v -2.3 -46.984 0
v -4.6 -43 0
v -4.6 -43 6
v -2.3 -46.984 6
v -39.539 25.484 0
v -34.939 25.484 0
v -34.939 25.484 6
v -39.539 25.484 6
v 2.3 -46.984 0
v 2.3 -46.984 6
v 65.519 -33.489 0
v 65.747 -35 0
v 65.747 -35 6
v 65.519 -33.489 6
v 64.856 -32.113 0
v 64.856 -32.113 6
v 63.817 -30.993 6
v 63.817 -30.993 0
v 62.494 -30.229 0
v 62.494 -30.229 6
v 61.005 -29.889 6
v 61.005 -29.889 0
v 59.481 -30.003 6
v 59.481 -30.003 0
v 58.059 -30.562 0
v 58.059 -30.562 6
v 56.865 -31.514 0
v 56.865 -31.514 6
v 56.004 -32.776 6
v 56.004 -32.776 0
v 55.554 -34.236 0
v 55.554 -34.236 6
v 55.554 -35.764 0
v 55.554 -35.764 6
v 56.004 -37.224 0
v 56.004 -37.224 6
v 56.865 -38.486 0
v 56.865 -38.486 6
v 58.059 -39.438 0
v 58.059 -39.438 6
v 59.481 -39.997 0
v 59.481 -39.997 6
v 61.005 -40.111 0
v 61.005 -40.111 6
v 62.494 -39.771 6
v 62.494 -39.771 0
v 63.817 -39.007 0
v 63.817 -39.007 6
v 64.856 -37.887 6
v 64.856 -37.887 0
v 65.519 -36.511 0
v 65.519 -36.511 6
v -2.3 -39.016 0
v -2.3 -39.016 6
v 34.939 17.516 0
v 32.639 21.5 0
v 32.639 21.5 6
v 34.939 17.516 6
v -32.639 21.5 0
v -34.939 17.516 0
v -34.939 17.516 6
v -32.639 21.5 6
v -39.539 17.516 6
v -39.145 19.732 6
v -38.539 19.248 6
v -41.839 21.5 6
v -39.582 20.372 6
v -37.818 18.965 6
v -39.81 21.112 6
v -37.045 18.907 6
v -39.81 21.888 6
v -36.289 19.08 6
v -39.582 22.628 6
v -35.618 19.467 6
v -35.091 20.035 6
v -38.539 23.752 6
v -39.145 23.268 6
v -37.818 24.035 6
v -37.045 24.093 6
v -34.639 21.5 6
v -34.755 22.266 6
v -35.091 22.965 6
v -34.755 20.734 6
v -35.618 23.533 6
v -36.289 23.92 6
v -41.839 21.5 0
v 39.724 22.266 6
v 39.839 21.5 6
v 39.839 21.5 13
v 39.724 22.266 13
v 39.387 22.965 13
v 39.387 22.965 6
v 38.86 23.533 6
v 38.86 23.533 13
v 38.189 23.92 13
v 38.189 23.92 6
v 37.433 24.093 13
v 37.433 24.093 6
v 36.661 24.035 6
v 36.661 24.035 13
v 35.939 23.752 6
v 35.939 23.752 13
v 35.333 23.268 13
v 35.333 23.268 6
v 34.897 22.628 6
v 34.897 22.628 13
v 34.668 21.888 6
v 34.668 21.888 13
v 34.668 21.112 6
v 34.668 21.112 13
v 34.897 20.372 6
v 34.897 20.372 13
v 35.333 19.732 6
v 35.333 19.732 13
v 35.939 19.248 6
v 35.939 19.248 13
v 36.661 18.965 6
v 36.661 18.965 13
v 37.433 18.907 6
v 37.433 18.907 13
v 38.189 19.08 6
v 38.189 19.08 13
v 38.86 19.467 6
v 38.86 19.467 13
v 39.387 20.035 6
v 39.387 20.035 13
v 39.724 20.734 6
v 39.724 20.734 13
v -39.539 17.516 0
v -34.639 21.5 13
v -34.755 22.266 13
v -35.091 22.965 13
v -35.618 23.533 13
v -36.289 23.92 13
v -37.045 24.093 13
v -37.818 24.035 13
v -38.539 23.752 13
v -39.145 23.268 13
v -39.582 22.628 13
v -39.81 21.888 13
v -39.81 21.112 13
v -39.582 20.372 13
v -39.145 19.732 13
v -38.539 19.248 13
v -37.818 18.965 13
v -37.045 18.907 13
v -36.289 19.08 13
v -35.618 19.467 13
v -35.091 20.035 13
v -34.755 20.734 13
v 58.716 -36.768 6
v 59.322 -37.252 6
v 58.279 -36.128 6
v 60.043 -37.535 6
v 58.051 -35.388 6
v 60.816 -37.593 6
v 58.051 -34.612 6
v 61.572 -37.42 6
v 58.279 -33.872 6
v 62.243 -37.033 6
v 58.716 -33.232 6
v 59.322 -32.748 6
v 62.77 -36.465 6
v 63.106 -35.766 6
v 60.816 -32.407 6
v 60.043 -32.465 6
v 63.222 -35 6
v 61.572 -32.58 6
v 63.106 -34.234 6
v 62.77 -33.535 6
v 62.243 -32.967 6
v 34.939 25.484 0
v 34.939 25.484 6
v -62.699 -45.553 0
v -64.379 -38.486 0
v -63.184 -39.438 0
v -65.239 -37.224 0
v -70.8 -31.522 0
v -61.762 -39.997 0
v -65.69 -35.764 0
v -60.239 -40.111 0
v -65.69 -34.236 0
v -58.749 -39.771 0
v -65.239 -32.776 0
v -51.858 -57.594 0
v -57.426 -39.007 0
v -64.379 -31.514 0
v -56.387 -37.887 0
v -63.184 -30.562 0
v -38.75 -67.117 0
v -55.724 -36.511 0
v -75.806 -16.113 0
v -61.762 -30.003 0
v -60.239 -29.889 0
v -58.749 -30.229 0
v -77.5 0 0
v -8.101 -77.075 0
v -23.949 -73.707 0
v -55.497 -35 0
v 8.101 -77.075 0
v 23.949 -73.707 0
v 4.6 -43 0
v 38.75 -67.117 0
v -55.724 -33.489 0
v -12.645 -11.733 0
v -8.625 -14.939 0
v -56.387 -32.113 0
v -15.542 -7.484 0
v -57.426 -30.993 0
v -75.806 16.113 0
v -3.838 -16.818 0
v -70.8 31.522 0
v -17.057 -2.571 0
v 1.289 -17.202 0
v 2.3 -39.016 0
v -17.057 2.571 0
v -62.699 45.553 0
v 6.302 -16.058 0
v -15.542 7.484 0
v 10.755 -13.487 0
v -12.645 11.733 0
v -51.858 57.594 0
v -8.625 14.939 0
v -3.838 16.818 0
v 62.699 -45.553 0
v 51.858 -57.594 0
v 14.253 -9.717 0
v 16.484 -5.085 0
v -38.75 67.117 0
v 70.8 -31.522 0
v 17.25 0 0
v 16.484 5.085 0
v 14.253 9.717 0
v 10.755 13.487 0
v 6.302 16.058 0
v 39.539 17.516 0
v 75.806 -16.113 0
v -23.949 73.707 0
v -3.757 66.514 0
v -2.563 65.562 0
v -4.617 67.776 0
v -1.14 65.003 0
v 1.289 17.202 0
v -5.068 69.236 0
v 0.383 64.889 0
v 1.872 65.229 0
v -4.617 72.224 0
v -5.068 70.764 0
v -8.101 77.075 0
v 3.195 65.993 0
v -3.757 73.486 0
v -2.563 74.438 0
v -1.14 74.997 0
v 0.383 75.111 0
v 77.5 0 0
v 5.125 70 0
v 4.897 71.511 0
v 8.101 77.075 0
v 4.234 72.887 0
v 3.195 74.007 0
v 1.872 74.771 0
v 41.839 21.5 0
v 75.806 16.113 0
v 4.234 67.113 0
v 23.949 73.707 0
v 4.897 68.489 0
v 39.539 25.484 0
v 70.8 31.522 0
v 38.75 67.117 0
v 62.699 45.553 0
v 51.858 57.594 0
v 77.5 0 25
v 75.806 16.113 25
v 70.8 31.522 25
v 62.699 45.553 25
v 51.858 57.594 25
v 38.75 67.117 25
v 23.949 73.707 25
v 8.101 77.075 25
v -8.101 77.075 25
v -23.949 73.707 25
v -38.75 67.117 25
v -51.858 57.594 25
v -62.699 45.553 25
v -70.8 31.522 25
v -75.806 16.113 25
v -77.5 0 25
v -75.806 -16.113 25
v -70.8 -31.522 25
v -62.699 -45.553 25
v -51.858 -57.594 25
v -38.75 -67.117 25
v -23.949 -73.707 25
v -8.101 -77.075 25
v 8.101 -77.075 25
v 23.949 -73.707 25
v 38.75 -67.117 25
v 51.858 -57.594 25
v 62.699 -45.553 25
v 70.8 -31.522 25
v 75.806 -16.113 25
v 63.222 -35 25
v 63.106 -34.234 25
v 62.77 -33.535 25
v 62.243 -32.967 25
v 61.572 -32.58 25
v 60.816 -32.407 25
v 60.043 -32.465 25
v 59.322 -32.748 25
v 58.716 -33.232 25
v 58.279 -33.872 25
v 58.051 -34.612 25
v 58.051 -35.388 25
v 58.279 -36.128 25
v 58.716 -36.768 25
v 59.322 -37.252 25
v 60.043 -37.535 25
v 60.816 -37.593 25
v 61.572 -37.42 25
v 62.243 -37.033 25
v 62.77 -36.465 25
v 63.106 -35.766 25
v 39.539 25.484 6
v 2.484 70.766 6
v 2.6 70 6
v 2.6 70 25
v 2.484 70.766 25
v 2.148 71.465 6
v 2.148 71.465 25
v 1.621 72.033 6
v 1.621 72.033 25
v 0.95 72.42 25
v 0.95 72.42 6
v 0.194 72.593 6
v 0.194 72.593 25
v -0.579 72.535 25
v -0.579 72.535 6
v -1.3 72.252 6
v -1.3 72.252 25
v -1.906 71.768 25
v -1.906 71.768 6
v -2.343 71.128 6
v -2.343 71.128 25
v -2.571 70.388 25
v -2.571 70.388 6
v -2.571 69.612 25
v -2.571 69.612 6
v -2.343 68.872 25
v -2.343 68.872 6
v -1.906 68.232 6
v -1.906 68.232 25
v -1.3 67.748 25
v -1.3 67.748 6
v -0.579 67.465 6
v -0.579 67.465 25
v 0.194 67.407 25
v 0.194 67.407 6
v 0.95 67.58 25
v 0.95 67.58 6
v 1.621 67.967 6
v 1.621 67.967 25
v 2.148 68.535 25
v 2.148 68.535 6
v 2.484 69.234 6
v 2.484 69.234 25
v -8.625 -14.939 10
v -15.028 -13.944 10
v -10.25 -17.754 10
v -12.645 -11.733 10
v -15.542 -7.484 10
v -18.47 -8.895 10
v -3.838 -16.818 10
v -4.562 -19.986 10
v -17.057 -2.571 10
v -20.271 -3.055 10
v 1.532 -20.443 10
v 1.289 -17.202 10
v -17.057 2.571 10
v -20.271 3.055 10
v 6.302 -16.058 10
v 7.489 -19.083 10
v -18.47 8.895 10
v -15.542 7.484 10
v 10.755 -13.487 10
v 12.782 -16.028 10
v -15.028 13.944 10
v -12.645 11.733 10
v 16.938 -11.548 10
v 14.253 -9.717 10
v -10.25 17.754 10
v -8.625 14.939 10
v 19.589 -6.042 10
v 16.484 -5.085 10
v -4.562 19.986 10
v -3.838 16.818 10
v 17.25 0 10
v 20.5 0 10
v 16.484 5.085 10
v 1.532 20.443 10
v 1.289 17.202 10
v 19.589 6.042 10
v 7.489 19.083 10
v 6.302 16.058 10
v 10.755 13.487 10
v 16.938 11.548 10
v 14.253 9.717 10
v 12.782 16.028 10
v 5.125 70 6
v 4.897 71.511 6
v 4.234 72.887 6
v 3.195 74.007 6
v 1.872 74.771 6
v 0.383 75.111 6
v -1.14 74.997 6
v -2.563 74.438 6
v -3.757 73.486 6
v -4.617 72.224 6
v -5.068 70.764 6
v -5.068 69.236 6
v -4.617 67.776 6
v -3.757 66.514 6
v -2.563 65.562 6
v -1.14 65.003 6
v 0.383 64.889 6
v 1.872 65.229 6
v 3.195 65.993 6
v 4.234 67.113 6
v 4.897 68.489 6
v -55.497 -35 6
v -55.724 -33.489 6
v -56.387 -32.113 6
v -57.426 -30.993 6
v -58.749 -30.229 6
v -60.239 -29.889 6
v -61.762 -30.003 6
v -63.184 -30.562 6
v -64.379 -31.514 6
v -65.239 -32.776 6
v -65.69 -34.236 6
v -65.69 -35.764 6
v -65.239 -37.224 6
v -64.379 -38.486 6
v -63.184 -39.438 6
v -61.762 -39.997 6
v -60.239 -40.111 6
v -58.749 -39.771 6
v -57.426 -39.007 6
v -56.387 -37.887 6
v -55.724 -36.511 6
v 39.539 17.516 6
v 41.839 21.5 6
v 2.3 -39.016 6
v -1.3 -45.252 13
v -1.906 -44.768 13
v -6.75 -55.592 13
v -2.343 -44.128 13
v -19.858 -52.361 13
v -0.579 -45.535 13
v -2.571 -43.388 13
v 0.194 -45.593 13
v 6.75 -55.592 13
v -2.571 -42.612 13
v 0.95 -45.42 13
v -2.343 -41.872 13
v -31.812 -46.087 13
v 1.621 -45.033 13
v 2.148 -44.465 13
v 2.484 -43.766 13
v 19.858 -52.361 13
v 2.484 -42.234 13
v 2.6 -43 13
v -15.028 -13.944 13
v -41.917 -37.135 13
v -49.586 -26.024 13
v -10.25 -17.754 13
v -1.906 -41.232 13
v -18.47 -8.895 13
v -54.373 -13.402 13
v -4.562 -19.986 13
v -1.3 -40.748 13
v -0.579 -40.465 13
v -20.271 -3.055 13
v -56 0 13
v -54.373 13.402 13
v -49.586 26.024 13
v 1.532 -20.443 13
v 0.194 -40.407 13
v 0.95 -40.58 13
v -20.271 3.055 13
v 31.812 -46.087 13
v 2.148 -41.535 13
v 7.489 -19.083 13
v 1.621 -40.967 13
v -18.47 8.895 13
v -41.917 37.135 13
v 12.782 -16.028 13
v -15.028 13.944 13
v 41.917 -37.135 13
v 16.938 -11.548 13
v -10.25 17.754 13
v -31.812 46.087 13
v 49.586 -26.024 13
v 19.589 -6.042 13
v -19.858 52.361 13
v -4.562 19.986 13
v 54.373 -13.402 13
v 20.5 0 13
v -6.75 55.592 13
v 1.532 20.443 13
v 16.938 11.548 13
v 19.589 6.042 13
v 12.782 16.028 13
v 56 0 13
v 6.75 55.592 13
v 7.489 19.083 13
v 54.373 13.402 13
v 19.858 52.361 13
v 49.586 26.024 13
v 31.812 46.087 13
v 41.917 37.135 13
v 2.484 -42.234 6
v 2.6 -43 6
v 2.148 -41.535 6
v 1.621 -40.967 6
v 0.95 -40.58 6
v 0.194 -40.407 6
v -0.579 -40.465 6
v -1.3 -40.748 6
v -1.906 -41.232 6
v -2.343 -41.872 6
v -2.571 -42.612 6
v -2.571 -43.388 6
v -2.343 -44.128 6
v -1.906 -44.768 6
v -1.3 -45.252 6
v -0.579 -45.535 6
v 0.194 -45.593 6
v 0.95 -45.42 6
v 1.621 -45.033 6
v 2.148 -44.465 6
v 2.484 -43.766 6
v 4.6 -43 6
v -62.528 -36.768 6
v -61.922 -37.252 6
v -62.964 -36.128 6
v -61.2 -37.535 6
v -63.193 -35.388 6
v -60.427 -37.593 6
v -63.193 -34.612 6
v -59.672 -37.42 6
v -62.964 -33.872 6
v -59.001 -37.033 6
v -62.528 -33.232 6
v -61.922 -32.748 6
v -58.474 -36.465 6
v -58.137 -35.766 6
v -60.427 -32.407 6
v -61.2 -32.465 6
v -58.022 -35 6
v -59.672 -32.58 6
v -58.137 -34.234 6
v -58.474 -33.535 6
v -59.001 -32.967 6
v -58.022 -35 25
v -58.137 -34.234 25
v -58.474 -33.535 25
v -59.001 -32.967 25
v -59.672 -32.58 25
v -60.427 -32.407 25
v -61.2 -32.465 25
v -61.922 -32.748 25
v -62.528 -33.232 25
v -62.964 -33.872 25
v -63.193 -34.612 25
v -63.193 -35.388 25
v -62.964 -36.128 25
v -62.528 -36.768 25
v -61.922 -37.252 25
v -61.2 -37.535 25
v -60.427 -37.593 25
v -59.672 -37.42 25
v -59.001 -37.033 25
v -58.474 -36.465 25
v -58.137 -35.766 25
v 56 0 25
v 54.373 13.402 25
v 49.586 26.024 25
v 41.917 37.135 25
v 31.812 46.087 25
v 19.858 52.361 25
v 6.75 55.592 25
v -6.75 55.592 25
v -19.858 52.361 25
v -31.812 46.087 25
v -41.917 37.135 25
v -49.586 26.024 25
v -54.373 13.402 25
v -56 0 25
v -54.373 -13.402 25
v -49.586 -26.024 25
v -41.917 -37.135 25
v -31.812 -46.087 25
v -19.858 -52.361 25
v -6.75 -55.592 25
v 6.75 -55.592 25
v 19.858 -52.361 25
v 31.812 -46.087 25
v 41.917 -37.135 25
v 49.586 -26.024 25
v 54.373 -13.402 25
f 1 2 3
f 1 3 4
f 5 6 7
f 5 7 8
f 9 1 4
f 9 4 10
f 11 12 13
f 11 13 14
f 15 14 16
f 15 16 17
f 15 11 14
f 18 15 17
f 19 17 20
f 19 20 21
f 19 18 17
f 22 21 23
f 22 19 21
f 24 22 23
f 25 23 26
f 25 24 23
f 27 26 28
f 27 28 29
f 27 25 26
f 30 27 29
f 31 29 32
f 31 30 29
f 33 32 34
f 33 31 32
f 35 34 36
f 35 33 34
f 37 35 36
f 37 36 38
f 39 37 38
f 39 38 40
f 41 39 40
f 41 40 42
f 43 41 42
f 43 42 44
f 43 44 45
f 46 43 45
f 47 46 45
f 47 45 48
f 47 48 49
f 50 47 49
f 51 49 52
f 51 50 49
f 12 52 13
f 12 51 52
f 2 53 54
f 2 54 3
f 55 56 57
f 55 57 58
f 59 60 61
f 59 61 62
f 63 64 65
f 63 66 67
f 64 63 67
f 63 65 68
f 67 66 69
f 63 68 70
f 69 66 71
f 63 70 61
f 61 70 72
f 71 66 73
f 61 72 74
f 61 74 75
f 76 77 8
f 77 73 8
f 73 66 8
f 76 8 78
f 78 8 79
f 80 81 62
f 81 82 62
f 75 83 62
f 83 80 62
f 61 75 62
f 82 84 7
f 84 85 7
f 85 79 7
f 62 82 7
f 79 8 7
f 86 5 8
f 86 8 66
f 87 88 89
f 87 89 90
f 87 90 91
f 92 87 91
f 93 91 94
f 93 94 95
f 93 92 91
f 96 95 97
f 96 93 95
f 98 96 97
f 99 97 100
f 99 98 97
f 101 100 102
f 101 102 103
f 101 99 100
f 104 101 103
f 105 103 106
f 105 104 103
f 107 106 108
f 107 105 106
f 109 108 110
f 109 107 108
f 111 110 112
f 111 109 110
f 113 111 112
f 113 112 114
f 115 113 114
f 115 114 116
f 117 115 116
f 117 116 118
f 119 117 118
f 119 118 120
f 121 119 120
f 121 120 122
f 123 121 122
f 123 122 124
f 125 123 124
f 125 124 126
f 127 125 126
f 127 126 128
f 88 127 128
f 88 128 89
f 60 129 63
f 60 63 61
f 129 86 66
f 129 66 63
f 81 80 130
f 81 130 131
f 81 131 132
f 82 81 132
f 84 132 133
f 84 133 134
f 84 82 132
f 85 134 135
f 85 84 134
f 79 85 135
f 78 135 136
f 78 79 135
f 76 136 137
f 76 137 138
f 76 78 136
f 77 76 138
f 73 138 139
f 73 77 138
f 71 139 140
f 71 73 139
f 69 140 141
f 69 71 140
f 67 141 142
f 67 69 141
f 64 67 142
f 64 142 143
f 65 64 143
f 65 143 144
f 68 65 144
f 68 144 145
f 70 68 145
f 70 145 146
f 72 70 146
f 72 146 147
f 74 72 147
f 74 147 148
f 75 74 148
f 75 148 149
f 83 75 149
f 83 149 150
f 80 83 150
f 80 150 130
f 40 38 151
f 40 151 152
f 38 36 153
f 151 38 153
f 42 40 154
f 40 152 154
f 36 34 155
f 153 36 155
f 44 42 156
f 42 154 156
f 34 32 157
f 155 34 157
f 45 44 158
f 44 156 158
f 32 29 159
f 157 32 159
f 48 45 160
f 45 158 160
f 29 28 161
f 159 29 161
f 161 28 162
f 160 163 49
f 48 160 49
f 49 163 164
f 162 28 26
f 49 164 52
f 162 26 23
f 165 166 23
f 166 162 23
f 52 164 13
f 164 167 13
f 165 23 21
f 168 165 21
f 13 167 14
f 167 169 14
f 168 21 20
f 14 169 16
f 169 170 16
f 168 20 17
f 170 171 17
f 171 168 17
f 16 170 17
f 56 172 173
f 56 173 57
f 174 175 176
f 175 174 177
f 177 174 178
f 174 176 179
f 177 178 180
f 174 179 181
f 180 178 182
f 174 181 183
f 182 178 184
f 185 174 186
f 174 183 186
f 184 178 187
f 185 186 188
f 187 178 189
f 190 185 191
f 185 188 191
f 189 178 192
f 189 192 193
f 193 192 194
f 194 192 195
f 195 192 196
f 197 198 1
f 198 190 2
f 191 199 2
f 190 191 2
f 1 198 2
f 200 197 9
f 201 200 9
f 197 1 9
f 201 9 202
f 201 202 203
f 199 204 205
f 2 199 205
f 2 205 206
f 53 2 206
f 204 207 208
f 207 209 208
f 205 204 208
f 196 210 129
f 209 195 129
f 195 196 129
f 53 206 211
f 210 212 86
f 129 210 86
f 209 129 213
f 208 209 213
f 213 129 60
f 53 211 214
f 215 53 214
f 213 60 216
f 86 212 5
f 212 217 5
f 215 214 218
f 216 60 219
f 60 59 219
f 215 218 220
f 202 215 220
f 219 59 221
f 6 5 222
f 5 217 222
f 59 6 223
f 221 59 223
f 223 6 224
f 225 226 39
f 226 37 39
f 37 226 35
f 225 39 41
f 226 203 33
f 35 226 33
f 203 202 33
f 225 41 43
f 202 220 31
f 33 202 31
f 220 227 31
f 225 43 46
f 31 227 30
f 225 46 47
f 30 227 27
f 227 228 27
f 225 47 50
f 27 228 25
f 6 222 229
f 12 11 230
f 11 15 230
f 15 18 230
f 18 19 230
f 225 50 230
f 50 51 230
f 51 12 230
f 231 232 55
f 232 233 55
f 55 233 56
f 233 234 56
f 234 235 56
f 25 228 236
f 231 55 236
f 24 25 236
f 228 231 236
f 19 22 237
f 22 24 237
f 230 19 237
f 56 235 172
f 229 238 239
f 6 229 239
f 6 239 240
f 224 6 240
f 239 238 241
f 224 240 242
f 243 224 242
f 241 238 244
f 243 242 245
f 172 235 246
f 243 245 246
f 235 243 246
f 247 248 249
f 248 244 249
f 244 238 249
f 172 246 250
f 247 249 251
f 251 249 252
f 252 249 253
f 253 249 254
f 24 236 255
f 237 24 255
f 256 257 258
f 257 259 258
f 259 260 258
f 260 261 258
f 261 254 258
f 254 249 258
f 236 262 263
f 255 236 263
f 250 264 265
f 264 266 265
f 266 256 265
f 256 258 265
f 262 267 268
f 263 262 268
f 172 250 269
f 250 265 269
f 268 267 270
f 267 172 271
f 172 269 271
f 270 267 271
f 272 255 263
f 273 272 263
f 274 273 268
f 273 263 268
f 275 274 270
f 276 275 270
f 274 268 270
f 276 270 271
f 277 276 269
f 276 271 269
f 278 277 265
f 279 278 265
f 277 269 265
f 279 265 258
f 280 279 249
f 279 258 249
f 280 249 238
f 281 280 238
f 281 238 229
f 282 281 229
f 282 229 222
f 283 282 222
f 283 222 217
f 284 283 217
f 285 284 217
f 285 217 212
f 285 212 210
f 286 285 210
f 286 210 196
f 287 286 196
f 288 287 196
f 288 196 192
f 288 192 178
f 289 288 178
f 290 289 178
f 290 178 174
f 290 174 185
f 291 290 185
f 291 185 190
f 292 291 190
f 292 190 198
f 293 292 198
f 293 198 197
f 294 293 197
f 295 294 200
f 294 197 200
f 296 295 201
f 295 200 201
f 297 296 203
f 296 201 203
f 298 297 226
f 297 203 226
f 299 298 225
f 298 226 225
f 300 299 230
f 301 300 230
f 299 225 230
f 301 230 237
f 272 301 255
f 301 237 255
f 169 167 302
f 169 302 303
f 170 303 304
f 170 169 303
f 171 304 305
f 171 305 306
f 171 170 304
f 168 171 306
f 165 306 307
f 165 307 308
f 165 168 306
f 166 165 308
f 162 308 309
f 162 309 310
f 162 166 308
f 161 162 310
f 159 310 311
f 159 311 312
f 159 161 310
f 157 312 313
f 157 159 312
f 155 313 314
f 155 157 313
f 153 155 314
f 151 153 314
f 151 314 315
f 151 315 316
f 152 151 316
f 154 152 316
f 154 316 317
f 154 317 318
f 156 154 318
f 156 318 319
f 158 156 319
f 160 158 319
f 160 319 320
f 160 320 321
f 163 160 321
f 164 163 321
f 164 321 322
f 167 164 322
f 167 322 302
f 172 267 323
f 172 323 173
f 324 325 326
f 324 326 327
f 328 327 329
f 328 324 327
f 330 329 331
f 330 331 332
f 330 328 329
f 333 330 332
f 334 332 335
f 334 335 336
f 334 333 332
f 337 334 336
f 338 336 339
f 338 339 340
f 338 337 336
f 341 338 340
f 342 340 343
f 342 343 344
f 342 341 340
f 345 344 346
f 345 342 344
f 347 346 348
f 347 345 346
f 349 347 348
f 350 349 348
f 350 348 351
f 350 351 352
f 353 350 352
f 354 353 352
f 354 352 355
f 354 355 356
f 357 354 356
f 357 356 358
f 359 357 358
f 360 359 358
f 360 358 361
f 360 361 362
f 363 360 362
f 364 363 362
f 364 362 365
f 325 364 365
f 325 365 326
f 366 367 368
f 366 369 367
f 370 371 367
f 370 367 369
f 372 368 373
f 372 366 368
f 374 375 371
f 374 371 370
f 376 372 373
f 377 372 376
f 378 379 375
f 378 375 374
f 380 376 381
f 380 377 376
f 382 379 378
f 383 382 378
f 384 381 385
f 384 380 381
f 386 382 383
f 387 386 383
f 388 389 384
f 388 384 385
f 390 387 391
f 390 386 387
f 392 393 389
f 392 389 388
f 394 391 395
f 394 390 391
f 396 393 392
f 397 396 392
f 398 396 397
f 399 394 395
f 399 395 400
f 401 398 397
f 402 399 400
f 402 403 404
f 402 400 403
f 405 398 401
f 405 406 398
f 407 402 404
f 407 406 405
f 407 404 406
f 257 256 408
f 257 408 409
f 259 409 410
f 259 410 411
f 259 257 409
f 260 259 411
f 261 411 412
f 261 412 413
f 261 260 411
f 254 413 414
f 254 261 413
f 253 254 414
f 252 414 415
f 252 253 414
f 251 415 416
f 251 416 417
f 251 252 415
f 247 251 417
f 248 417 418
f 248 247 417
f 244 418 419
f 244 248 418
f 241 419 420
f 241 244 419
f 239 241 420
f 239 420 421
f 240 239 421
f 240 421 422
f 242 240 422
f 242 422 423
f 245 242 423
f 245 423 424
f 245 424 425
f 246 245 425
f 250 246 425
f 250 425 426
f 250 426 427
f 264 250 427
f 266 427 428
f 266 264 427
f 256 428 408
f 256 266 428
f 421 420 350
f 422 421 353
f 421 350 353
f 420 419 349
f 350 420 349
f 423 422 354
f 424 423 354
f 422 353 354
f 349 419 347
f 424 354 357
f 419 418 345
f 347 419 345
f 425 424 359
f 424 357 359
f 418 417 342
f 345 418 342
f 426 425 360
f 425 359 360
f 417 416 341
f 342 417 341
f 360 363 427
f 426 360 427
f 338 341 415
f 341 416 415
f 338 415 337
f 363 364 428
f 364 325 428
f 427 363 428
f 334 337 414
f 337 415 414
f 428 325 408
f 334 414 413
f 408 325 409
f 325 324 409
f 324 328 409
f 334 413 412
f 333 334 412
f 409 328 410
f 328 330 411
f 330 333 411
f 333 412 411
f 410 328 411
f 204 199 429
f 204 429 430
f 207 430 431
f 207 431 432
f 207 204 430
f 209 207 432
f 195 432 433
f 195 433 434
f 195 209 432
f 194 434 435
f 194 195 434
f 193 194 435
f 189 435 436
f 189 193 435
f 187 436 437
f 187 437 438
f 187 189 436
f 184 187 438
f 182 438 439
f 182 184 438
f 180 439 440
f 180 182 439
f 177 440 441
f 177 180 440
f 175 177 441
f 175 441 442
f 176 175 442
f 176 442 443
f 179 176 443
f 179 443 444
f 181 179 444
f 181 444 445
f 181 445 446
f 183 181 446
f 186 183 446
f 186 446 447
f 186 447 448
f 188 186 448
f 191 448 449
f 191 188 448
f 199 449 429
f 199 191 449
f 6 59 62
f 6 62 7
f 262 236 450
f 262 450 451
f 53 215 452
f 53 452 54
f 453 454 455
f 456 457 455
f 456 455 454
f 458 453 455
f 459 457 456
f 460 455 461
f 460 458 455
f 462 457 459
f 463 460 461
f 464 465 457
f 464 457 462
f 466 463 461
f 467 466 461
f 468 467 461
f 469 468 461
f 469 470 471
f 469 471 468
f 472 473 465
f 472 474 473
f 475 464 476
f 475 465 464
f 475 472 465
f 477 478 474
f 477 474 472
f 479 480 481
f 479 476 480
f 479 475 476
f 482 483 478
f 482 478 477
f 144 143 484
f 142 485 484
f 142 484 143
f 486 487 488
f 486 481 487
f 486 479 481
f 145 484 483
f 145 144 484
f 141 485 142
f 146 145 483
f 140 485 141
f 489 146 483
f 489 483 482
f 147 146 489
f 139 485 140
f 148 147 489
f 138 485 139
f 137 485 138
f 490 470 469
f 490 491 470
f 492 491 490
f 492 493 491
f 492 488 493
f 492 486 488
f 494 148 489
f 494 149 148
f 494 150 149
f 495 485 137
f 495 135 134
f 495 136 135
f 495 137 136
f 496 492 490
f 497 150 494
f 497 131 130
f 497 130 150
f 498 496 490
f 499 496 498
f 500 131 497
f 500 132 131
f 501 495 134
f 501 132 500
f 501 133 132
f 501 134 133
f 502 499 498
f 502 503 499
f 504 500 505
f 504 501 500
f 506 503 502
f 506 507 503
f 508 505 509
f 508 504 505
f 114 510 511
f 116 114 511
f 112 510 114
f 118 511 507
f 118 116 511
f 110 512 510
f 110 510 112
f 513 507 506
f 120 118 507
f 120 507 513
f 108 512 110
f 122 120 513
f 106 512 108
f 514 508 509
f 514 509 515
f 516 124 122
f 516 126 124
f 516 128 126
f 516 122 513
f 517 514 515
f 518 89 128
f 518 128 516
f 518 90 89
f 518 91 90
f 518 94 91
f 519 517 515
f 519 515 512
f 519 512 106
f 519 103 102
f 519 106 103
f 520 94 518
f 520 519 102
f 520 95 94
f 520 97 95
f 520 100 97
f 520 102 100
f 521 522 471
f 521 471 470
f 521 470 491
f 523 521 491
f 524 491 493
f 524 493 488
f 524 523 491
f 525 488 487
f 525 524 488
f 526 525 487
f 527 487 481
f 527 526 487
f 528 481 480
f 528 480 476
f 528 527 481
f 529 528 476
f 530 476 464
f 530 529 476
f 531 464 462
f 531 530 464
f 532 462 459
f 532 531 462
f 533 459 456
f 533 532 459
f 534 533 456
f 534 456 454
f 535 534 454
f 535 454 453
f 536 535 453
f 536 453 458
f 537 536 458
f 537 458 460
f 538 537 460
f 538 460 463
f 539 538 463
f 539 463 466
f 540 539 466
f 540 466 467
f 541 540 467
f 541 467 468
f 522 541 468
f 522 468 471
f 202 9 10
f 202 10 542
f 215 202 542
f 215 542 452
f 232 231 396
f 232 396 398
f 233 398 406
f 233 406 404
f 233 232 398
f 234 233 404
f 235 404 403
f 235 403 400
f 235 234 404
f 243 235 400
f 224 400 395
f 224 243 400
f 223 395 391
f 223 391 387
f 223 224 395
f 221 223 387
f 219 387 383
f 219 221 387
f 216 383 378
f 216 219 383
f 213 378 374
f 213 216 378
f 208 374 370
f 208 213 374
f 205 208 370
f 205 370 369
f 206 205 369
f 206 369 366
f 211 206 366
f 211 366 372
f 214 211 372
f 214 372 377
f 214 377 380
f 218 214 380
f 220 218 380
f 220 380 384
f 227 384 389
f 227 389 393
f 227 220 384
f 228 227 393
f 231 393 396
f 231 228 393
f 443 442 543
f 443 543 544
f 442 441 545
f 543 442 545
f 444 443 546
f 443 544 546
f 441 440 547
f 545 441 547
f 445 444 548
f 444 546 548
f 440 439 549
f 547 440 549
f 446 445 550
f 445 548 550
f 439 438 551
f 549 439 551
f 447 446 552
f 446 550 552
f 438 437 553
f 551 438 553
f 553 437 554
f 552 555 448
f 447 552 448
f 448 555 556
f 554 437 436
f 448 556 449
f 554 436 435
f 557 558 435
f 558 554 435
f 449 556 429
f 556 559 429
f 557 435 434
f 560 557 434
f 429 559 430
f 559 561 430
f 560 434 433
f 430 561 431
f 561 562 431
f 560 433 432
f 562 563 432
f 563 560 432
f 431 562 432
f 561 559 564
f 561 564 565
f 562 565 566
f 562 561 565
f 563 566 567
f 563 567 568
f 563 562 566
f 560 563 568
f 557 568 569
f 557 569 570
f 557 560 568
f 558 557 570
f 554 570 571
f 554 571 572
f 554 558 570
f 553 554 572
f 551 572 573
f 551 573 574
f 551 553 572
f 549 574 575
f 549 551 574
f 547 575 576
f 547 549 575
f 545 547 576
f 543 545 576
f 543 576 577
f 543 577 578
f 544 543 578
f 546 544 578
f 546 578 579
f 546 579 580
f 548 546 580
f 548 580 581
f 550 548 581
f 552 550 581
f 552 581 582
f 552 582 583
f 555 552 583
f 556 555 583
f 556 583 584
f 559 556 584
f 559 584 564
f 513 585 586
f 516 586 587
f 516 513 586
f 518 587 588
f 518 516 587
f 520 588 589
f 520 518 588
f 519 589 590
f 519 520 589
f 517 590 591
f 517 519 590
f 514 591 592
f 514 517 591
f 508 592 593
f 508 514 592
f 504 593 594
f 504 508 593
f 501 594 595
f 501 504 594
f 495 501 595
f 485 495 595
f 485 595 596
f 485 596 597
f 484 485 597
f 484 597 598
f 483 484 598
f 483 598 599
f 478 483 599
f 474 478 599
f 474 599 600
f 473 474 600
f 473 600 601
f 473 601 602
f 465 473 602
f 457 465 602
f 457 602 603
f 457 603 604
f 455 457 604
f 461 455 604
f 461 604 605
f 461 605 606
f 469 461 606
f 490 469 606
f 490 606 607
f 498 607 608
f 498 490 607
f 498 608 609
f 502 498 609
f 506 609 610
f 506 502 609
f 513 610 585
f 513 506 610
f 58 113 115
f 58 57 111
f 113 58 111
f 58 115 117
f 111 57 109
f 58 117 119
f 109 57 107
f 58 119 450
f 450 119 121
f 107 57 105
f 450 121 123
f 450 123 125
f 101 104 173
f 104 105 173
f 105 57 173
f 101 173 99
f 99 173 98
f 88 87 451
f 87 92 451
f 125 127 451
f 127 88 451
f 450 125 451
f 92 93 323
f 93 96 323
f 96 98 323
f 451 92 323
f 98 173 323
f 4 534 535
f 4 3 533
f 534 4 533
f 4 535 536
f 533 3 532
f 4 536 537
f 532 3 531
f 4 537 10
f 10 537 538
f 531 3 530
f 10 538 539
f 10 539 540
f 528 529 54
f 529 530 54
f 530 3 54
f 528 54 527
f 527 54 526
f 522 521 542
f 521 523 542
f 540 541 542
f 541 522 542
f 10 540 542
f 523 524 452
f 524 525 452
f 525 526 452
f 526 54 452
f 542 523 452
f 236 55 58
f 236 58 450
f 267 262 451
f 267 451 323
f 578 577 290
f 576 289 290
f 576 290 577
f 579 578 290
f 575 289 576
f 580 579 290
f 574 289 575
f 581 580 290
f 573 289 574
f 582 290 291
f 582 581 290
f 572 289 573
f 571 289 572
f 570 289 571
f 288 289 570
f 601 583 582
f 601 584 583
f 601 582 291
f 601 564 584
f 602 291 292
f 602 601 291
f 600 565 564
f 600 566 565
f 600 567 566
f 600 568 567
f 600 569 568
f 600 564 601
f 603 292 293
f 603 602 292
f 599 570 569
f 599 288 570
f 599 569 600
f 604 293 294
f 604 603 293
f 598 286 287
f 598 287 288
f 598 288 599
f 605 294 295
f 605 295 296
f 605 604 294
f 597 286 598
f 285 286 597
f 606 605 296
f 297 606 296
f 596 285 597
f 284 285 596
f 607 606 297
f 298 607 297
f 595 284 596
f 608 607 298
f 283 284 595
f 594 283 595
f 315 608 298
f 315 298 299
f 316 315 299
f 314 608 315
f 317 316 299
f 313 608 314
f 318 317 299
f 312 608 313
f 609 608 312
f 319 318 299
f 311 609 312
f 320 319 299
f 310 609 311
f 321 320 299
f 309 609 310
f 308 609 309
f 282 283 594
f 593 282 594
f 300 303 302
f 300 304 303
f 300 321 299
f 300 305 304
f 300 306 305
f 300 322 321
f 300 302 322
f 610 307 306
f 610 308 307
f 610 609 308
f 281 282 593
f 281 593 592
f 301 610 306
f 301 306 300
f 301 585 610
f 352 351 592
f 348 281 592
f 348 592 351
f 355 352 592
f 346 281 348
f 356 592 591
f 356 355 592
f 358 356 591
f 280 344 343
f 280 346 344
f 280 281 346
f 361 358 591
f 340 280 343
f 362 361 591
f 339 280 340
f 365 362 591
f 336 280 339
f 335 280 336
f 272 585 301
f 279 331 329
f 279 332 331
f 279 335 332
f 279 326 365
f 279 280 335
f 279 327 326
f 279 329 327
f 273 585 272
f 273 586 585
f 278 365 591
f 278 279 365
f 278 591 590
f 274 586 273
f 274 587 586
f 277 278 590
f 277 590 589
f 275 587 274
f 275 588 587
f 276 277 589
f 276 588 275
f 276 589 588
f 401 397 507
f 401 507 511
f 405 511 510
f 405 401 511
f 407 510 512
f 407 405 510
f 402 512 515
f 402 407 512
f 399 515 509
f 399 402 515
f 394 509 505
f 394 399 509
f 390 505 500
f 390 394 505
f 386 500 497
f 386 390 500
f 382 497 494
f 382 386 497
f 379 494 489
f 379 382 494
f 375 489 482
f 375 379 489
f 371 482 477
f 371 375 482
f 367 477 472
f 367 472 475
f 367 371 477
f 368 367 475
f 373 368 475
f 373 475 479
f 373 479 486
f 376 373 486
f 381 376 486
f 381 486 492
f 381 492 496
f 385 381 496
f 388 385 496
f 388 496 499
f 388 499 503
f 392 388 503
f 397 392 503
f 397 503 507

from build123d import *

# Parameters (mm, degrees)
F0_R     = 77.5
F0_R_2   = 5.125
F0_R_3   = 56
F0_R_4   = 20.5
F0_R_5   = 2.6
F1_DEPTH = 13
F2_DEPTH = 25
F0_R_6   = 17.25
F3_DEPTH = 10
F4_DEPTH = 6
F5_DEPTH = 6


with BuildPart() as f1:
    # F0 (on Top) → F1 (new body)
    with BuildSketch(Plane.XY):
        Circle(F0_R)
        with Locations((-60.621778, -35)):
            Circle(F0_R_2, mode=Mode.SUBTRACT)
        with Locations((60.621778, -35)):
            Circle(F0_R_2, mode=Mode.SUBTRACT)
        Circle(F0_R_3, mode=Mode.SUBTRACT)
        with Locations((0, 70)):
            Circle(F0_R_2, mode=Mode.SUBTRACT)
        Circle(F0_R_3)
        Polygon((-4.6, -43), (-2.3, -39.016283), (2.3, -39.016283), (4.6, -43), (2.3, -46.983717), (-2.3, -46.983717), align=None, mode=Mode.SUBTRACT)
        Polygon((-34.939092, 25.483717), (-32.639092, 21.5), (-34.939092, 17.516283), (-39.539092, 17.516283), (-41.839092, 21.5), (-39.539092, 25.483717), align=None, mode=Mode.SUBTRACT)
        Circle(F0_R_4, mode=Mode.SUBTRACT)
        Polygon((34.939092, 17.516283), (32.639092, 21.5), (34.939092, 25.483717), (39.539092, 25.483717), (41.839092, 21.5), (39.539092, 17.516283), align=None, mode=Mode.SUBTRACT)
        with Locations((0, 70)):
            Circle(F0_R_2)
        with Locations((0, 70)):
            Circle(F0_R_5, mode=Mode.SUBTRACT)
        Polygon((-34.939092, 17.516283), (-32.639092, 21.5), (-34.939092, 25.483717), (-39.539092, 25.483717), (-41.839092, 21.5), (-39.539092, 17.516283), align=None)
        with Locations((-37.239092, 21.5)):
            Circle(F0_R_5, mode=Mode.SUBTRACT)
        Polygon((34.939092, 25.483717), (32.639092, 21.5), (34.939092, 17.516283), (39.539092, 17.516283), (41.839092, 21.5), (39.539092, 25.483717), align=None)
        with Locations((37.239092, 21.5)):
            Circle(F0_R_5, mode=Mode.SUBTRACT)
        with Locations((60.621778, -35)):
            Circle(F0_R_2)
        with Locations((60.621778, -35)):
            Circle(F0_R_5, mode=Mode.SUBTRACT)
        Polygon((2.3, -39.016283), (-2.3, -39.016283), (-4.6, -43), (-2.3, -46.983717), (2.3, -46.983717), (4.6, -43), align=None)
        with Locations((0, -43)):
            Circle(F0_R_5, mode=Mode.SUBTRACT)
        with Locations((-60.621778, -35)):
            Circle(F0_R_2)
        with Locations((-60.621778, -35)):
            Circle(F0_R_5, mode=Mode.SUBTRACT)
    extrude(amount=F1_DEPTH)

    # F0 (on Top) → F2 (join)
    with BuildSketch(Plane.XY):
        Circle(F0_R)
        with Locations((-60.621778, -35)):
            Circle(F0_R_2, mode=Mode.SUBTRACT)
        with Locations((60.621778, -35)):
            Circle(F0_R_2, mode=Mode.SUBTRACT)
        Circle(F0_R_3, mode=Mode.SUBTRACT)
        with Locations((0, 70)):
            Circle(F0_R_2, mode=Mode.SUBTRACT)
        with Locations((0, 70)):
            Circle(F0_R_2)
        with Locations((0, 70)):
            Circle(F0_R_5, mode=Mode.SUBTRACT)
        with Locations((60.621778, -35)):
            Circle(F0_R_2)
        with Locations((60.621778, -35)):
            Circle(F0_R_5, mode=Mode.SUBTRACT)
        with Locations((-60.621778, -35)):
            Circle(F0_R_2)
        with Locations((-60.621778, -35)):
            Circle(F0_R_5, mode=Mode.SUBTRACT)
    extrude(amount=F2_DEPTH)

    # F0 (on Top) → F3 (join)
    with BuildSketch(Plane.XY):
        Circle(F0_R_4)
        Circle(F0_R_6, mode=Mode.SUBTRACT)
    extrude(amount=F3_DEPTH)

    # F0 (on Top) → F4 (cut)
    with BuildSketch(Plane.XY):
        with Locations((0, 70)):
            Circle(F0_R_2)
        with Locations((0, 70)):
            Circle(F0_R_5, mode=Mode.SUBTRACT)
        with Locations((-60.621778, -35)):
            Circle(F0_R_2)
        with Locations((-60.621778, -35)):
            Circle(F0_R_5, mode=Mode.SUBTRACT)
        with Locations((60.621778, -35)):
            Circle(F0_R_2)
        with Locations((60.621778, -35)):
            Circle(F0_R_5, mode=Mode.SUBTRACT)
    extrude(amount=F4_DEPTH, mode=Mode.SUBTRACT)

    # F0 (on Top) → F5 (cut)
    with BuildSketch(Plane.XY):
        Polygon((34.939092, 25.483717), (32.639092, 21.5), (34.939092, 17.516283), (39.539092, 17.516283), (41.839092, 21.5), (39.539092, 25.483717), align=None)
        with Locations((37.239092, 21.5)):
            Circle(F0_R_5, mode=Mode.SUBTRACT)
        Polygon((-34.939092, 17.516283), (-32.639092, 21.5), (-34.939092, 25.483717), (-39.539092, 25.483717), (-41.839092, 21.5), (-39.539092, 17.516283), align=None)
        with Locations((-37.239092, 21.5)):
            Circle(F0_R_5, mode=Mode.SUBTRACT)
        Polygon((2.3, -39.016283), (-2.3, -39.016283), (-4.6, -43), (-2.3, -46.983717), (2.3, -46.983717), (4.6, -43), align=None)
        with Locations((0, -43)):
            Circle(F0_R_5, mode=Mode.SUBTRACT)
    extrude(amount=F5_DEPTH, mode=Mode.SUBTRACT)


solid = f1.part
